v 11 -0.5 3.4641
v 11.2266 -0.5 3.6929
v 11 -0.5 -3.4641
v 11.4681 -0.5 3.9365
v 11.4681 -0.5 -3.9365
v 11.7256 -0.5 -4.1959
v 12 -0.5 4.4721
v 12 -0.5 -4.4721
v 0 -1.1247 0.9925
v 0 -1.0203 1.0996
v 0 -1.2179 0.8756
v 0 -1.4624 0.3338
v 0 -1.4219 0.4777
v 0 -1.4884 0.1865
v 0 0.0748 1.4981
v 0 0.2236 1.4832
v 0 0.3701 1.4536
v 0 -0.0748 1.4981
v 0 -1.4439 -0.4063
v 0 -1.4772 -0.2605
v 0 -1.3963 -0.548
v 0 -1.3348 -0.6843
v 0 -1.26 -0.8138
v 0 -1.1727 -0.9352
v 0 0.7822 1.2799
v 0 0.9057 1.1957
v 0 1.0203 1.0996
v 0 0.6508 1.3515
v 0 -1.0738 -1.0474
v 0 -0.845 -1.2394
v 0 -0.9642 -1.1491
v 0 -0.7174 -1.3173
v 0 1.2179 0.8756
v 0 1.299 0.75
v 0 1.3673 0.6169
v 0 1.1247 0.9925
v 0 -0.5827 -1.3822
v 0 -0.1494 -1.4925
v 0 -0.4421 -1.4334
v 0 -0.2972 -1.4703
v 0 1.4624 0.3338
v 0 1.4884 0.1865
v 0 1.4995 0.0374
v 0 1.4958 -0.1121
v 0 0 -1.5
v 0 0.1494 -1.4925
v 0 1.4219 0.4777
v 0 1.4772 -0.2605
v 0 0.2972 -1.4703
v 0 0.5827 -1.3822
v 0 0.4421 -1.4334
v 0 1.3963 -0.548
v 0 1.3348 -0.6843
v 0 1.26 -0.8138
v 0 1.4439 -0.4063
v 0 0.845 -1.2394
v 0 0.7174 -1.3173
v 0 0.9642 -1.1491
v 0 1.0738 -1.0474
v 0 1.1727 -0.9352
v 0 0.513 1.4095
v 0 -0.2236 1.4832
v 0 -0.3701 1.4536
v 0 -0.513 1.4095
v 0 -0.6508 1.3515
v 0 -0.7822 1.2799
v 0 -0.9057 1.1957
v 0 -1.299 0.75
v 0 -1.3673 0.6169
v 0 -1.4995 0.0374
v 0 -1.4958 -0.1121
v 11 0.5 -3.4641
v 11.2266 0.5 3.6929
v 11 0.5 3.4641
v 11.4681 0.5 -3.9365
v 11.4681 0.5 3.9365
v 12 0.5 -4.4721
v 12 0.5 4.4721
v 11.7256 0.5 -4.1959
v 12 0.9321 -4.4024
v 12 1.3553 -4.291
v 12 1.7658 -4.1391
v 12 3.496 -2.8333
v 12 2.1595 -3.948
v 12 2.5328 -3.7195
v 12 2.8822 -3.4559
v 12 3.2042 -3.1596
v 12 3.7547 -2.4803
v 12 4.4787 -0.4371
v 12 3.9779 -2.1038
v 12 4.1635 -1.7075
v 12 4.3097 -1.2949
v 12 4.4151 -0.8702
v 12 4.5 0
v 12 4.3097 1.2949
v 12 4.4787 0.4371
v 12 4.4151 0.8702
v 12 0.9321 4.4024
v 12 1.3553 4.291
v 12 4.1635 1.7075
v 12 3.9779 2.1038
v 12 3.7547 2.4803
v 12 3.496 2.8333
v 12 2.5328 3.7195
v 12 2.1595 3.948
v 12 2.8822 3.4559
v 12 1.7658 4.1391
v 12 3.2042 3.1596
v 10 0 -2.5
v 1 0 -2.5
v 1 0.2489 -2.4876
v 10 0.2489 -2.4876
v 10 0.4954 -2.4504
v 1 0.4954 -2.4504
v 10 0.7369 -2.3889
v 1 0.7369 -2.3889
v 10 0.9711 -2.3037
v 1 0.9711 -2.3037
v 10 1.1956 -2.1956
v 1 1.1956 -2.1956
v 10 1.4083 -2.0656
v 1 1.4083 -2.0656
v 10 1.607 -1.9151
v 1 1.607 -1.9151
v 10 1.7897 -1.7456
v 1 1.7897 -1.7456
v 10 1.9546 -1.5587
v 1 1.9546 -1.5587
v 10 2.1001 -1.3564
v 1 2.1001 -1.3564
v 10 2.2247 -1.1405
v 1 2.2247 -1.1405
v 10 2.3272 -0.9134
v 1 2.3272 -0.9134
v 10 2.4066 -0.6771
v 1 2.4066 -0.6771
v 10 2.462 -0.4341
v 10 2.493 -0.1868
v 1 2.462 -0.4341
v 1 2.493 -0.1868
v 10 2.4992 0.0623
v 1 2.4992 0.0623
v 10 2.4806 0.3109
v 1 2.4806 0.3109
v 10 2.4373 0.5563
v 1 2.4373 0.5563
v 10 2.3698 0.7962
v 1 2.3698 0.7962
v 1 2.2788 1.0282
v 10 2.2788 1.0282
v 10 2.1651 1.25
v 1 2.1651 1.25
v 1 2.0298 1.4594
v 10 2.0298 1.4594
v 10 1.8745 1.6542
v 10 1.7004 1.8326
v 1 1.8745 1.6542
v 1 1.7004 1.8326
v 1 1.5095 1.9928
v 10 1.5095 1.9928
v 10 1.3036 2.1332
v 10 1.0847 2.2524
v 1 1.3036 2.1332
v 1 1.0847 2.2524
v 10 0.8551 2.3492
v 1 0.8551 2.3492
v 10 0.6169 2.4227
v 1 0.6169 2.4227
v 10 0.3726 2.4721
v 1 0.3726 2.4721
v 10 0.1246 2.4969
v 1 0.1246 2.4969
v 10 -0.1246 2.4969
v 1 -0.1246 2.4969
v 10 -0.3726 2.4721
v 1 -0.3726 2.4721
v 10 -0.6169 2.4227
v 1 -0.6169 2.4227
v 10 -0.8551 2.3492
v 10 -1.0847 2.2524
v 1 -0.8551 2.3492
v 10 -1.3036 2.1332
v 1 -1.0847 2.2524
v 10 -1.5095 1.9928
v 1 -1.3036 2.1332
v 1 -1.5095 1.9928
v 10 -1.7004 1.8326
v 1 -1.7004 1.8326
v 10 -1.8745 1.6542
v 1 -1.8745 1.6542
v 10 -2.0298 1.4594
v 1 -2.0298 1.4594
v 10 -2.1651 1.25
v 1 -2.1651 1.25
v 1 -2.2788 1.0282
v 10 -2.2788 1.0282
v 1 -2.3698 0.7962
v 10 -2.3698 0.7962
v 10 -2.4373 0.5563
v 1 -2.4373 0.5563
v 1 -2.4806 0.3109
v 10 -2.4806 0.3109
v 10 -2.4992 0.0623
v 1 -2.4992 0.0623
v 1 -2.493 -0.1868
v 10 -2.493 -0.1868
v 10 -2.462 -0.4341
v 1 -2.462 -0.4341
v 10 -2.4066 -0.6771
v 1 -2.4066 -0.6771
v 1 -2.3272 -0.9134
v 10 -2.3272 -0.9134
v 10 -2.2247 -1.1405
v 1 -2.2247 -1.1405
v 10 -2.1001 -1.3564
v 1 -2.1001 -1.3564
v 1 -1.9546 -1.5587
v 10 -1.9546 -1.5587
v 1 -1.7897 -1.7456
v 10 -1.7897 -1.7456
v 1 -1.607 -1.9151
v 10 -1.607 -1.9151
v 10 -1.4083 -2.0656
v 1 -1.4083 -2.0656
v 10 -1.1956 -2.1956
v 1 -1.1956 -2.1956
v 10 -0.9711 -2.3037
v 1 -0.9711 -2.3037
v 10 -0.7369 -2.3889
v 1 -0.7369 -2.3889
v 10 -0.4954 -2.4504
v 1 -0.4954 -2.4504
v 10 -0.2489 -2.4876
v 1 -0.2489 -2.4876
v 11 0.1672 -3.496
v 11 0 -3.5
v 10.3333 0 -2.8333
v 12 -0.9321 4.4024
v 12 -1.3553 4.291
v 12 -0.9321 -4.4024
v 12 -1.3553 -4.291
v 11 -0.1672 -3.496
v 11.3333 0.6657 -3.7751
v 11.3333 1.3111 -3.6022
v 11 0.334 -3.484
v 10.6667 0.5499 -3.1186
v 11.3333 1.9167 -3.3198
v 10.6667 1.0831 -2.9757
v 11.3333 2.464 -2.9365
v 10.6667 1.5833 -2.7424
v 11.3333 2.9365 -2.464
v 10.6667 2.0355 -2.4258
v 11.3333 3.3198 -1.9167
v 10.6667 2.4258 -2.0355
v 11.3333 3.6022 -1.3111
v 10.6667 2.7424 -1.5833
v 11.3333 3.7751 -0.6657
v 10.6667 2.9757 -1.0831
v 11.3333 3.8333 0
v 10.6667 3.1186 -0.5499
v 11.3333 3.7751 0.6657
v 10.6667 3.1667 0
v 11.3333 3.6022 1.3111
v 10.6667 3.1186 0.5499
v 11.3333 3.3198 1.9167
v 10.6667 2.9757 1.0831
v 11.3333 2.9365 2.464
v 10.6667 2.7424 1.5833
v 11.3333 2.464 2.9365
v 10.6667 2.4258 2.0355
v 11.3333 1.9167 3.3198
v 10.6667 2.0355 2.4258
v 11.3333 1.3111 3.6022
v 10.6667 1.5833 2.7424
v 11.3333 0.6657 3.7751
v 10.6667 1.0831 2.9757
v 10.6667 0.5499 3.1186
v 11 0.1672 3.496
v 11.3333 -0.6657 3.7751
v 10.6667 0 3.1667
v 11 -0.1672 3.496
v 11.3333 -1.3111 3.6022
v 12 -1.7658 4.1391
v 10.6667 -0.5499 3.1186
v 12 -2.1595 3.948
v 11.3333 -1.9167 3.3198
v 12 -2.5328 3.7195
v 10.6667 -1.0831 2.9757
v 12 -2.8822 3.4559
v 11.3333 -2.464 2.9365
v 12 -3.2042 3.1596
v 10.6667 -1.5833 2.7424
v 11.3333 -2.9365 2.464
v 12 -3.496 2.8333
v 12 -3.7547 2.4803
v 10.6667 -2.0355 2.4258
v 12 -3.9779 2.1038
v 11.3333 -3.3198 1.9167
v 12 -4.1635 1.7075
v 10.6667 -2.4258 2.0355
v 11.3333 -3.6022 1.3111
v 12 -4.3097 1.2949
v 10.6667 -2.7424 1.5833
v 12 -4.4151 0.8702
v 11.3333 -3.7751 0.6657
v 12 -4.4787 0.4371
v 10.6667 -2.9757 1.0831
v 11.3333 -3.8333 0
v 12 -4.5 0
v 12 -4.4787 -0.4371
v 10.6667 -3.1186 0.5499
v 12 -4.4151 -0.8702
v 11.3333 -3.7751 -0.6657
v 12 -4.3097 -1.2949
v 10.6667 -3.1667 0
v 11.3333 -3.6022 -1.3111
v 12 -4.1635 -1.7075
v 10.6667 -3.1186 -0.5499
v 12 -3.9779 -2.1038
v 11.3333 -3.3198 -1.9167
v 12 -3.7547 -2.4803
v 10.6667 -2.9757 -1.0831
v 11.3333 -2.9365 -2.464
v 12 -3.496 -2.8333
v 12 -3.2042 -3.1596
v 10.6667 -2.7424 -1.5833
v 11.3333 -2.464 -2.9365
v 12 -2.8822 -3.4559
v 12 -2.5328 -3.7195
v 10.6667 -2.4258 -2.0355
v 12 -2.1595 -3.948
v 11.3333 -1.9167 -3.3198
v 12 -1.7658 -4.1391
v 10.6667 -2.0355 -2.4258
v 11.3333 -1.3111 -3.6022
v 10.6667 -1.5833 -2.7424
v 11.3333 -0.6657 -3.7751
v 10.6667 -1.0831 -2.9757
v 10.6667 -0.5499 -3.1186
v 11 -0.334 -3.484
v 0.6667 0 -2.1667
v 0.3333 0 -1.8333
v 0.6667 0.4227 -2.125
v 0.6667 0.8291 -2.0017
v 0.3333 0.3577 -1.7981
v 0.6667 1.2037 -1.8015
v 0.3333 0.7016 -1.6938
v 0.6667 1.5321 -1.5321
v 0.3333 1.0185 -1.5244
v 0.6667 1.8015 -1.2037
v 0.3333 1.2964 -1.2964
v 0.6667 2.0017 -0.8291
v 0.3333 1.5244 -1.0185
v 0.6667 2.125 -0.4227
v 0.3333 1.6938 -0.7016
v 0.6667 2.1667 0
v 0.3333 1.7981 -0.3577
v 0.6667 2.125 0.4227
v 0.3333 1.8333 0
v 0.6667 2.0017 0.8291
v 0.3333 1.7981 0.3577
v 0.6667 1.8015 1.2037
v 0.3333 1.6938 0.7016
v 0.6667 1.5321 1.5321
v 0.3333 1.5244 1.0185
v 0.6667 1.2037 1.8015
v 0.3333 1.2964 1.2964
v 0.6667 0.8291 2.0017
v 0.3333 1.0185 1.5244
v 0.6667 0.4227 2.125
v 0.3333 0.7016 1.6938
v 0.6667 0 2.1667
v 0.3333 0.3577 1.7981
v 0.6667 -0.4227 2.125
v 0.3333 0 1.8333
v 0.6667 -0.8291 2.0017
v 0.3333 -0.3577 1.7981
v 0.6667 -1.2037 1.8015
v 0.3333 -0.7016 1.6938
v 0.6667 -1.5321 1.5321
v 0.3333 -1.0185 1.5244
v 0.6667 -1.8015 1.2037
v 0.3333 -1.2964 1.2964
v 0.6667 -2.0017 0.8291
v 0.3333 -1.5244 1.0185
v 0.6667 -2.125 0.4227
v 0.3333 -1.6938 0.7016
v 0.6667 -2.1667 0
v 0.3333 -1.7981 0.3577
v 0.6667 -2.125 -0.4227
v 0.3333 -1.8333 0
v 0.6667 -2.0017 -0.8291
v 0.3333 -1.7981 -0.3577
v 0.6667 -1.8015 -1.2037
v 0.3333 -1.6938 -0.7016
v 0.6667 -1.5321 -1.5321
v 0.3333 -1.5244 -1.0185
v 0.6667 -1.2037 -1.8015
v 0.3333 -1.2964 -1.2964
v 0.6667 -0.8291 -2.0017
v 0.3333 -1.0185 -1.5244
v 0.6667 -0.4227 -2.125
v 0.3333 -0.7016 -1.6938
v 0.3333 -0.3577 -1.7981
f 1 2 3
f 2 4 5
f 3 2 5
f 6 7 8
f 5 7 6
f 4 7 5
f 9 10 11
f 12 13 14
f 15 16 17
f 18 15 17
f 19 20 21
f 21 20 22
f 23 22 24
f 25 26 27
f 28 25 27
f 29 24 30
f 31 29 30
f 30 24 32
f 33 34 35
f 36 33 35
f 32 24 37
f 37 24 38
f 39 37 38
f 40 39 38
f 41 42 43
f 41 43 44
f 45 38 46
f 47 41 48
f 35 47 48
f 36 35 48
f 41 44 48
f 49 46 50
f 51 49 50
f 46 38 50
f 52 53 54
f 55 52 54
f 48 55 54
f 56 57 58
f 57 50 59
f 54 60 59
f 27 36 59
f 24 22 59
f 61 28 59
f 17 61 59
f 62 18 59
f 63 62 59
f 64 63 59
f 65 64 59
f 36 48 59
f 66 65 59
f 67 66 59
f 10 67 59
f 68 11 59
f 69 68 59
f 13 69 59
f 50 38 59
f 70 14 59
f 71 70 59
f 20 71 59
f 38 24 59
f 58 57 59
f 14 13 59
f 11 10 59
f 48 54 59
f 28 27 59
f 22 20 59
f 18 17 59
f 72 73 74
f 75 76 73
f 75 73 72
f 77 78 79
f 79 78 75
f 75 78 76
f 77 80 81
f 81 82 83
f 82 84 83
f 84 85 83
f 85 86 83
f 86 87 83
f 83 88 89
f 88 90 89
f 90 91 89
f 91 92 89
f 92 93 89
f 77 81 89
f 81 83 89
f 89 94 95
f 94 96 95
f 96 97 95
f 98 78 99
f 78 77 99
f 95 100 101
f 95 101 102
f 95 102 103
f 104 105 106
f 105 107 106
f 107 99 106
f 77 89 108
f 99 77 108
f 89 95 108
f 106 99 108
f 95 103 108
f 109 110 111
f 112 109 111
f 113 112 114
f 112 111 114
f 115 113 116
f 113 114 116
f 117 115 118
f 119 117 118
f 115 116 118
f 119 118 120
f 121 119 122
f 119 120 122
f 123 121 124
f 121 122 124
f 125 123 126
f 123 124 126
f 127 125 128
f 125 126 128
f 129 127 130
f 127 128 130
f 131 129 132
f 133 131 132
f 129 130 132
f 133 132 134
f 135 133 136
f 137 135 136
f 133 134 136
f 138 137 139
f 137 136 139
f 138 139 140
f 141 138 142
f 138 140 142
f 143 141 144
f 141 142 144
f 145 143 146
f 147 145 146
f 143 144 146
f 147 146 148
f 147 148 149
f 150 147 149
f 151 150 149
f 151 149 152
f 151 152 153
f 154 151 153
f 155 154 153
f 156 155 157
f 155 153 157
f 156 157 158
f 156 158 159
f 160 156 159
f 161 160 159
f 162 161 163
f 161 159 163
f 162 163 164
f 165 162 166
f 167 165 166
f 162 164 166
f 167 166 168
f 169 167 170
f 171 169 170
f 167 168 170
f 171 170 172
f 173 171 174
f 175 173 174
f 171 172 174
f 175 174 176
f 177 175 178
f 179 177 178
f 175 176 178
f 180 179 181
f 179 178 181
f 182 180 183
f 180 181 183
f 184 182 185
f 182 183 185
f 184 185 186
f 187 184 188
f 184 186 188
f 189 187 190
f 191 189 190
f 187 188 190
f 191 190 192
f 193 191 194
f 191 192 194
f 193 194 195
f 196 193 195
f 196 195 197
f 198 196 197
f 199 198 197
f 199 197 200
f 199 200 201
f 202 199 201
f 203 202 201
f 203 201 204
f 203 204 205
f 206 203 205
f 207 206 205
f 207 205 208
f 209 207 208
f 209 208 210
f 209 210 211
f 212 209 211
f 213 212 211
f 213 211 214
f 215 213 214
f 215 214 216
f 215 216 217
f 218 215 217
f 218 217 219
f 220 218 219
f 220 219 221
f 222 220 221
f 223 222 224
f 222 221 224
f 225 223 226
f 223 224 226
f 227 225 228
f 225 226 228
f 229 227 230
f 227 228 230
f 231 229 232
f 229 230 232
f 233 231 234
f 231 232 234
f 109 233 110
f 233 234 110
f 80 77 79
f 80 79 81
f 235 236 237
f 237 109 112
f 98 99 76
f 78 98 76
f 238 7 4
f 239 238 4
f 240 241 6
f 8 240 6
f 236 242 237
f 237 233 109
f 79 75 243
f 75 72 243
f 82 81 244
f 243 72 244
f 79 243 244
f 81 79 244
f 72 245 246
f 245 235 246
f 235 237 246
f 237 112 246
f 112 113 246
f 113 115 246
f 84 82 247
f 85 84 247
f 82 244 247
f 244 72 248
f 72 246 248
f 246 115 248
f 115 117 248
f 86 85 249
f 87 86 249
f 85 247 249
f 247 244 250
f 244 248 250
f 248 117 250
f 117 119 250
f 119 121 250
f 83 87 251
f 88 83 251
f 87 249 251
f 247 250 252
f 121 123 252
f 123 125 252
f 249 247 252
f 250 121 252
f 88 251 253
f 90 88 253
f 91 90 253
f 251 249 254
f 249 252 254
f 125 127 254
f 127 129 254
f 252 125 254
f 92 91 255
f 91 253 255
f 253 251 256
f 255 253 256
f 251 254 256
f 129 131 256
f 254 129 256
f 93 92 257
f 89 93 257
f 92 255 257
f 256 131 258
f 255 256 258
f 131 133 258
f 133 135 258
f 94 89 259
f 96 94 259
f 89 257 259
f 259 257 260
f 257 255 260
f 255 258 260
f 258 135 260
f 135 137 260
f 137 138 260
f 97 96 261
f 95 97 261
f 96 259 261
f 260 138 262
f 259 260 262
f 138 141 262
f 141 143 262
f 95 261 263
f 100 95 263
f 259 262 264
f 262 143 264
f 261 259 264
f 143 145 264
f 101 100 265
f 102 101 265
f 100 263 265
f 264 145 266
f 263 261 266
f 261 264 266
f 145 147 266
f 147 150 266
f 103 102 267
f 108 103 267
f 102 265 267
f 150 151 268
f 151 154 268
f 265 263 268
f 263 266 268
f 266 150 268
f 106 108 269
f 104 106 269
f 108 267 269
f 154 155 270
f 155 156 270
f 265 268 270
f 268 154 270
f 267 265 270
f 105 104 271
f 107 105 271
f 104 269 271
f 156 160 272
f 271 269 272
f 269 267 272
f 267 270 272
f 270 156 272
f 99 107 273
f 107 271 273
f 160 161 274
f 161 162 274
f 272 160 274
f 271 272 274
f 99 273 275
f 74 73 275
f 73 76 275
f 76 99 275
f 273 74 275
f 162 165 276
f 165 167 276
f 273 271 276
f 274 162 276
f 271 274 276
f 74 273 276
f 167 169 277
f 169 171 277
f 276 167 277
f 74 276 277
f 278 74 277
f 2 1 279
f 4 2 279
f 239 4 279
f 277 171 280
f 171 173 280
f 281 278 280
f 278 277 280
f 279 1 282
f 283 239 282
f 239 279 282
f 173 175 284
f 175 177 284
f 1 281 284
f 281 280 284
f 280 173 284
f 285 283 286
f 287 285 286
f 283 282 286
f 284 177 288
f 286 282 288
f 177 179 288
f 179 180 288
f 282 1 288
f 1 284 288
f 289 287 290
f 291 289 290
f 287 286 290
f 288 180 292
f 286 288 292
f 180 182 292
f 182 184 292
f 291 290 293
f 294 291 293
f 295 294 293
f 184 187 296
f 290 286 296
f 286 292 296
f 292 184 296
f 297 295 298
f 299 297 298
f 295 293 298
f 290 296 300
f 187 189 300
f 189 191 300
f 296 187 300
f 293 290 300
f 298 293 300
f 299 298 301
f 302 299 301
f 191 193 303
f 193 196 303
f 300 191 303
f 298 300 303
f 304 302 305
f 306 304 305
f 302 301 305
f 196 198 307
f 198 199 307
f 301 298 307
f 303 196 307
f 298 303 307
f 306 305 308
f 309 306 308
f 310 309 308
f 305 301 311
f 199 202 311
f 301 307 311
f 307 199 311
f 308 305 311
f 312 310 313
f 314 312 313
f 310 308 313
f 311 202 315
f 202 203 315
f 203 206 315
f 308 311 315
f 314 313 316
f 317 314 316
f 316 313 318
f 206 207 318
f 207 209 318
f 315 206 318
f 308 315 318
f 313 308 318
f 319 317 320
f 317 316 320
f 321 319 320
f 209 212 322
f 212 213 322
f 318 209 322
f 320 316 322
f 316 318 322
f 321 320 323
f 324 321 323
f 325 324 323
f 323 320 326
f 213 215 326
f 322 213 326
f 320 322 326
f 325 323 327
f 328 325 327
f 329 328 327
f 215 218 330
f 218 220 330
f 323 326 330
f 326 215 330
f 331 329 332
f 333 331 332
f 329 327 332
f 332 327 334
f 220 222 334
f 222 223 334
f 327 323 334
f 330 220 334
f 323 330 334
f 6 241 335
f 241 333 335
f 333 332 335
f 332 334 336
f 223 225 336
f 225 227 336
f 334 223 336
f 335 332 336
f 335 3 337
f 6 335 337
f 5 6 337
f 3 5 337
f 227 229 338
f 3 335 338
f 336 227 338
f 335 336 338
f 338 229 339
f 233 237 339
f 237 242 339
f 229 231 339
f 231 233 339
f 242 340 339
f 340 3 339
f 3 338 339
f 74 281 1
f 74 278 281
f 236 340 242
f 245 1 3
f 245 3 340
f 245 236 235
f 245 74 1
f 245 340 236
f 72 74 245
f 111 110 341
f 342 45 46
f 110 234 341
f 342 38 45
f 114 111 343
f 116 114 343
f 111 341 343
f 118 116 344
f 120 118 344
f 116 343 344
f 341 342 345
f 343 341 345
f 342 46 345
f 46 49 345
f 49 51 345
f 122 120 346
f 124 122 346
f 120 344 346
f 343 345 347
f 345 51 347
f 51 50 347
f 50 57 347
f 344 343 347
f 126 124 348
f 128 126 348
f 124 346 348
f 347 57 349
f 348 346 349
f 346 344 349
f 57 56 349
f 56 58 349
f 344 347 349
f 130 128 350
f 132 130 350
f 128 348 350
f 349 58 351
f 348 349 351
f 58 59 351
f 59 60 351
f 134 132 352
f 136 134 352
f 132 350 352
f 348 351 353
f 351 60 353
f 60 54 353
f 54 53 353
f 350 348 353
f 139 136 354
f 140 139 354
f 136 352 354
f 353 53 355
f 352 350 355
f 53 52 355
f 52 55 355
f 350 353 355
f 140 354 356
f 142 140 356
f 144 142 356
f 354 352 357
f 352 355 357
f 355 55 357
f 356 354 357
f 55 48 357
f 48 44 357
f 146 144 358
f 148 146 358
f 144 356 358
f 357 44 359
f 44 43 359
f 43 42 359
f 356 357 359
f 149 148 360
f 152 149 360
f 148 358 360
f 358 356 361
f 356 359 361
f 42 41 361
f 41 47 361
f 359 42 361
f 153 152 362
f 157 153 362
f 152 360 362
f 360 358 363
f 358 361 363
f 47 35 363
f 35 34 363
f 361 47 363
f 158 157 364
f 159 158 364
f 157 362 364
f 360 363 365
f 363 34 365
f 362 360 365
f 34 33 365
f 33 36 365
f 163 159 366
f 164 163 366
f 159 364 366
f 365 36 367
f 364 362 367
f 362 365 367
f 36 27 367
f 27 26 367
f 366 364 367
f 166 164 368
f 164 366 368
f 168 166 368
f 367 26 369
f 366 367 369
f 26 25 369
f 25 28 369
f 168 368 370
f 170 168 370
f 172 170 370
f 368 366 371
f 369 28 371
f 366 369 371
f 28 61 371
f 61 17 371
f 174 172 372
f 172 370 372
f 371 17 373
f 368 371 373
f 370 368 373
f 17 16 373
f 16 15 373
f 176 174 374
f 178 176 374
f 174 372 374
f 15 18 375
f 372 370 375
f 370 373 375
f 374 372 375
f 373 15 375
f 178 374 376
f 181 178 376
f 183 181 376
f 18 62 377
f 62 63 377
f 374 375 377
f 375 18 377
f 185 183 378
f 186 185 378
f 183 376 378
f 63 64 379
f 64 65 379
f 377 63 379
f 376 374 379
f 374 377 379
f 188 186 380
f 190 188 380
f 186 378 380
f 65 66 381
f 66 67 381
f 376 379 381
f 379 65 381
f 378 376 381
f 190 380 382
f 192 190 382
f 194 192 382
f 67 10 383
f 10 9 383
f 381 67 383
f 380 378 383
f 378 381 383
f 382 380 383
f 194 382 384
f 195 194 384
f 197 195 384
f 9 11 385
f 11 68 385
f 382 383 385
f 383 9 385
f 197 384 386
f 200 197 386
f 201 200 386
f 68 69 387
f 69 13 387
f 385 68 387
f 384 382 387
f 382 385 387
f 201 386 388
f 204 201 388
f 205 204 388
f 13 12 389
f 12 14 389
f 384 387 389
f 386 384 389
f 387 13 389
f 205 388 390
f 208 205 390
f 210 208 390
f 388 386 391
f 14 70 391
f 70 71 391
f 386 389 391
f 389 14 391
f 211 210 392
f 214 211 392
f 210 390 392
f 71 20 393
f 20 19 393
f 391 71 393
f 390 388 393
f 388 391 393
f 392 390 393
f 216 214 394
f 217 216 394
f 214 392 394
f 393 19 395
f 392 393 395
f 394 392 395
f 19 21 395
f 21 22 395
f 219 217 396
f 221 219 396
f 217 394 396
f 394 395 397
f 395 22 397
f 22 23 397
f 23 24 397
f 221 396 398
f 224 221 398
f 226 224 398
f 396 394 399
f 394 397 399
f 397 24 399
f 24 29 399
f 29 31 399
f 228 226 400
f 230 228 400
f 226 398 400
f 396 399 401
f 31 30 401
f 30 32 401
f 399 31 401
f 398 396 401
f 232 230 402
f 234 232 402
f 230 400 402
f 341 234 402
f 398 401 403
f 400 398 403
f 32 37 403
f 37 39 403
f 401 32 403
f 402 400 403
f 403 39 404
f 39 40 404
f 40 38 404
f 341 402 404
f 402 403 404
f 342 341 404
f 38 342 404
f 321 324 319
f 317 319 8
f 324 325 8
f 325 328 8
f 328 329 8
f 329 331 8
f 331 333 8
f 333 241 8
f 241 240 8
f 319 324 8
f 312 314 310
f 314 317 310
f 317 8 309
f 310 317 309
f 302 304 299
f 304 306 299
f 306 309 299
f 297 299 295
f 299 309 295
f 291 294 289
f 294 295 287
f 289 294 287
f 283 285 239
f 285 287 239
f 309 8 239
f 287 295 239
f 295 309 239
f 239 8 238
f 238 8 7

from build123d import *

# Parameters (mm, degrees)
CHAMFER_1_SIZE      = 1
SKETCH_2_W          = 9.657524734
SKETCH_2_H          = 1
CUT_EXTRUDE_1_DEPTH = 1


with BuildPart() as part:
    # Эскиз1 → Повернуть1 (revolve)
    with BuildSketch(Plane(origin=(0, 0, 0), x_dir=(1, 0, 0), z_dir=(0, 1, 0))):
        Polygon((0, 0), (12, 0), (12, 4.5), (10, 2.5), (0, 2.5), align=None)
    revolve(axis=Axis((0, 0, 0), (1, 0, 0)))

    # Фаска1
    chamfer_1_edges = [part.edges().sort_by_distance(p)[0] for p in [
        (0, 0, 2.5),
    ]]
    chamfer(chamfer_1_edges, length=CHAMFER_1_SIZE)

    # Эскиз2 → Вырез-Вытянуть1 (cut)
    with BuildSketch(Plane(origin=(12, 0, 0), x_dir=(0, 0, -1), z_dir=(1, 0, 0))):
        Rectangle(SKETCH_2_W, SKETCH_2_H)
    extrude(amount=-CUT_EXTRUDE_1_DEPTH, mode=Mode.SUBTRACT)


solid = part.part
